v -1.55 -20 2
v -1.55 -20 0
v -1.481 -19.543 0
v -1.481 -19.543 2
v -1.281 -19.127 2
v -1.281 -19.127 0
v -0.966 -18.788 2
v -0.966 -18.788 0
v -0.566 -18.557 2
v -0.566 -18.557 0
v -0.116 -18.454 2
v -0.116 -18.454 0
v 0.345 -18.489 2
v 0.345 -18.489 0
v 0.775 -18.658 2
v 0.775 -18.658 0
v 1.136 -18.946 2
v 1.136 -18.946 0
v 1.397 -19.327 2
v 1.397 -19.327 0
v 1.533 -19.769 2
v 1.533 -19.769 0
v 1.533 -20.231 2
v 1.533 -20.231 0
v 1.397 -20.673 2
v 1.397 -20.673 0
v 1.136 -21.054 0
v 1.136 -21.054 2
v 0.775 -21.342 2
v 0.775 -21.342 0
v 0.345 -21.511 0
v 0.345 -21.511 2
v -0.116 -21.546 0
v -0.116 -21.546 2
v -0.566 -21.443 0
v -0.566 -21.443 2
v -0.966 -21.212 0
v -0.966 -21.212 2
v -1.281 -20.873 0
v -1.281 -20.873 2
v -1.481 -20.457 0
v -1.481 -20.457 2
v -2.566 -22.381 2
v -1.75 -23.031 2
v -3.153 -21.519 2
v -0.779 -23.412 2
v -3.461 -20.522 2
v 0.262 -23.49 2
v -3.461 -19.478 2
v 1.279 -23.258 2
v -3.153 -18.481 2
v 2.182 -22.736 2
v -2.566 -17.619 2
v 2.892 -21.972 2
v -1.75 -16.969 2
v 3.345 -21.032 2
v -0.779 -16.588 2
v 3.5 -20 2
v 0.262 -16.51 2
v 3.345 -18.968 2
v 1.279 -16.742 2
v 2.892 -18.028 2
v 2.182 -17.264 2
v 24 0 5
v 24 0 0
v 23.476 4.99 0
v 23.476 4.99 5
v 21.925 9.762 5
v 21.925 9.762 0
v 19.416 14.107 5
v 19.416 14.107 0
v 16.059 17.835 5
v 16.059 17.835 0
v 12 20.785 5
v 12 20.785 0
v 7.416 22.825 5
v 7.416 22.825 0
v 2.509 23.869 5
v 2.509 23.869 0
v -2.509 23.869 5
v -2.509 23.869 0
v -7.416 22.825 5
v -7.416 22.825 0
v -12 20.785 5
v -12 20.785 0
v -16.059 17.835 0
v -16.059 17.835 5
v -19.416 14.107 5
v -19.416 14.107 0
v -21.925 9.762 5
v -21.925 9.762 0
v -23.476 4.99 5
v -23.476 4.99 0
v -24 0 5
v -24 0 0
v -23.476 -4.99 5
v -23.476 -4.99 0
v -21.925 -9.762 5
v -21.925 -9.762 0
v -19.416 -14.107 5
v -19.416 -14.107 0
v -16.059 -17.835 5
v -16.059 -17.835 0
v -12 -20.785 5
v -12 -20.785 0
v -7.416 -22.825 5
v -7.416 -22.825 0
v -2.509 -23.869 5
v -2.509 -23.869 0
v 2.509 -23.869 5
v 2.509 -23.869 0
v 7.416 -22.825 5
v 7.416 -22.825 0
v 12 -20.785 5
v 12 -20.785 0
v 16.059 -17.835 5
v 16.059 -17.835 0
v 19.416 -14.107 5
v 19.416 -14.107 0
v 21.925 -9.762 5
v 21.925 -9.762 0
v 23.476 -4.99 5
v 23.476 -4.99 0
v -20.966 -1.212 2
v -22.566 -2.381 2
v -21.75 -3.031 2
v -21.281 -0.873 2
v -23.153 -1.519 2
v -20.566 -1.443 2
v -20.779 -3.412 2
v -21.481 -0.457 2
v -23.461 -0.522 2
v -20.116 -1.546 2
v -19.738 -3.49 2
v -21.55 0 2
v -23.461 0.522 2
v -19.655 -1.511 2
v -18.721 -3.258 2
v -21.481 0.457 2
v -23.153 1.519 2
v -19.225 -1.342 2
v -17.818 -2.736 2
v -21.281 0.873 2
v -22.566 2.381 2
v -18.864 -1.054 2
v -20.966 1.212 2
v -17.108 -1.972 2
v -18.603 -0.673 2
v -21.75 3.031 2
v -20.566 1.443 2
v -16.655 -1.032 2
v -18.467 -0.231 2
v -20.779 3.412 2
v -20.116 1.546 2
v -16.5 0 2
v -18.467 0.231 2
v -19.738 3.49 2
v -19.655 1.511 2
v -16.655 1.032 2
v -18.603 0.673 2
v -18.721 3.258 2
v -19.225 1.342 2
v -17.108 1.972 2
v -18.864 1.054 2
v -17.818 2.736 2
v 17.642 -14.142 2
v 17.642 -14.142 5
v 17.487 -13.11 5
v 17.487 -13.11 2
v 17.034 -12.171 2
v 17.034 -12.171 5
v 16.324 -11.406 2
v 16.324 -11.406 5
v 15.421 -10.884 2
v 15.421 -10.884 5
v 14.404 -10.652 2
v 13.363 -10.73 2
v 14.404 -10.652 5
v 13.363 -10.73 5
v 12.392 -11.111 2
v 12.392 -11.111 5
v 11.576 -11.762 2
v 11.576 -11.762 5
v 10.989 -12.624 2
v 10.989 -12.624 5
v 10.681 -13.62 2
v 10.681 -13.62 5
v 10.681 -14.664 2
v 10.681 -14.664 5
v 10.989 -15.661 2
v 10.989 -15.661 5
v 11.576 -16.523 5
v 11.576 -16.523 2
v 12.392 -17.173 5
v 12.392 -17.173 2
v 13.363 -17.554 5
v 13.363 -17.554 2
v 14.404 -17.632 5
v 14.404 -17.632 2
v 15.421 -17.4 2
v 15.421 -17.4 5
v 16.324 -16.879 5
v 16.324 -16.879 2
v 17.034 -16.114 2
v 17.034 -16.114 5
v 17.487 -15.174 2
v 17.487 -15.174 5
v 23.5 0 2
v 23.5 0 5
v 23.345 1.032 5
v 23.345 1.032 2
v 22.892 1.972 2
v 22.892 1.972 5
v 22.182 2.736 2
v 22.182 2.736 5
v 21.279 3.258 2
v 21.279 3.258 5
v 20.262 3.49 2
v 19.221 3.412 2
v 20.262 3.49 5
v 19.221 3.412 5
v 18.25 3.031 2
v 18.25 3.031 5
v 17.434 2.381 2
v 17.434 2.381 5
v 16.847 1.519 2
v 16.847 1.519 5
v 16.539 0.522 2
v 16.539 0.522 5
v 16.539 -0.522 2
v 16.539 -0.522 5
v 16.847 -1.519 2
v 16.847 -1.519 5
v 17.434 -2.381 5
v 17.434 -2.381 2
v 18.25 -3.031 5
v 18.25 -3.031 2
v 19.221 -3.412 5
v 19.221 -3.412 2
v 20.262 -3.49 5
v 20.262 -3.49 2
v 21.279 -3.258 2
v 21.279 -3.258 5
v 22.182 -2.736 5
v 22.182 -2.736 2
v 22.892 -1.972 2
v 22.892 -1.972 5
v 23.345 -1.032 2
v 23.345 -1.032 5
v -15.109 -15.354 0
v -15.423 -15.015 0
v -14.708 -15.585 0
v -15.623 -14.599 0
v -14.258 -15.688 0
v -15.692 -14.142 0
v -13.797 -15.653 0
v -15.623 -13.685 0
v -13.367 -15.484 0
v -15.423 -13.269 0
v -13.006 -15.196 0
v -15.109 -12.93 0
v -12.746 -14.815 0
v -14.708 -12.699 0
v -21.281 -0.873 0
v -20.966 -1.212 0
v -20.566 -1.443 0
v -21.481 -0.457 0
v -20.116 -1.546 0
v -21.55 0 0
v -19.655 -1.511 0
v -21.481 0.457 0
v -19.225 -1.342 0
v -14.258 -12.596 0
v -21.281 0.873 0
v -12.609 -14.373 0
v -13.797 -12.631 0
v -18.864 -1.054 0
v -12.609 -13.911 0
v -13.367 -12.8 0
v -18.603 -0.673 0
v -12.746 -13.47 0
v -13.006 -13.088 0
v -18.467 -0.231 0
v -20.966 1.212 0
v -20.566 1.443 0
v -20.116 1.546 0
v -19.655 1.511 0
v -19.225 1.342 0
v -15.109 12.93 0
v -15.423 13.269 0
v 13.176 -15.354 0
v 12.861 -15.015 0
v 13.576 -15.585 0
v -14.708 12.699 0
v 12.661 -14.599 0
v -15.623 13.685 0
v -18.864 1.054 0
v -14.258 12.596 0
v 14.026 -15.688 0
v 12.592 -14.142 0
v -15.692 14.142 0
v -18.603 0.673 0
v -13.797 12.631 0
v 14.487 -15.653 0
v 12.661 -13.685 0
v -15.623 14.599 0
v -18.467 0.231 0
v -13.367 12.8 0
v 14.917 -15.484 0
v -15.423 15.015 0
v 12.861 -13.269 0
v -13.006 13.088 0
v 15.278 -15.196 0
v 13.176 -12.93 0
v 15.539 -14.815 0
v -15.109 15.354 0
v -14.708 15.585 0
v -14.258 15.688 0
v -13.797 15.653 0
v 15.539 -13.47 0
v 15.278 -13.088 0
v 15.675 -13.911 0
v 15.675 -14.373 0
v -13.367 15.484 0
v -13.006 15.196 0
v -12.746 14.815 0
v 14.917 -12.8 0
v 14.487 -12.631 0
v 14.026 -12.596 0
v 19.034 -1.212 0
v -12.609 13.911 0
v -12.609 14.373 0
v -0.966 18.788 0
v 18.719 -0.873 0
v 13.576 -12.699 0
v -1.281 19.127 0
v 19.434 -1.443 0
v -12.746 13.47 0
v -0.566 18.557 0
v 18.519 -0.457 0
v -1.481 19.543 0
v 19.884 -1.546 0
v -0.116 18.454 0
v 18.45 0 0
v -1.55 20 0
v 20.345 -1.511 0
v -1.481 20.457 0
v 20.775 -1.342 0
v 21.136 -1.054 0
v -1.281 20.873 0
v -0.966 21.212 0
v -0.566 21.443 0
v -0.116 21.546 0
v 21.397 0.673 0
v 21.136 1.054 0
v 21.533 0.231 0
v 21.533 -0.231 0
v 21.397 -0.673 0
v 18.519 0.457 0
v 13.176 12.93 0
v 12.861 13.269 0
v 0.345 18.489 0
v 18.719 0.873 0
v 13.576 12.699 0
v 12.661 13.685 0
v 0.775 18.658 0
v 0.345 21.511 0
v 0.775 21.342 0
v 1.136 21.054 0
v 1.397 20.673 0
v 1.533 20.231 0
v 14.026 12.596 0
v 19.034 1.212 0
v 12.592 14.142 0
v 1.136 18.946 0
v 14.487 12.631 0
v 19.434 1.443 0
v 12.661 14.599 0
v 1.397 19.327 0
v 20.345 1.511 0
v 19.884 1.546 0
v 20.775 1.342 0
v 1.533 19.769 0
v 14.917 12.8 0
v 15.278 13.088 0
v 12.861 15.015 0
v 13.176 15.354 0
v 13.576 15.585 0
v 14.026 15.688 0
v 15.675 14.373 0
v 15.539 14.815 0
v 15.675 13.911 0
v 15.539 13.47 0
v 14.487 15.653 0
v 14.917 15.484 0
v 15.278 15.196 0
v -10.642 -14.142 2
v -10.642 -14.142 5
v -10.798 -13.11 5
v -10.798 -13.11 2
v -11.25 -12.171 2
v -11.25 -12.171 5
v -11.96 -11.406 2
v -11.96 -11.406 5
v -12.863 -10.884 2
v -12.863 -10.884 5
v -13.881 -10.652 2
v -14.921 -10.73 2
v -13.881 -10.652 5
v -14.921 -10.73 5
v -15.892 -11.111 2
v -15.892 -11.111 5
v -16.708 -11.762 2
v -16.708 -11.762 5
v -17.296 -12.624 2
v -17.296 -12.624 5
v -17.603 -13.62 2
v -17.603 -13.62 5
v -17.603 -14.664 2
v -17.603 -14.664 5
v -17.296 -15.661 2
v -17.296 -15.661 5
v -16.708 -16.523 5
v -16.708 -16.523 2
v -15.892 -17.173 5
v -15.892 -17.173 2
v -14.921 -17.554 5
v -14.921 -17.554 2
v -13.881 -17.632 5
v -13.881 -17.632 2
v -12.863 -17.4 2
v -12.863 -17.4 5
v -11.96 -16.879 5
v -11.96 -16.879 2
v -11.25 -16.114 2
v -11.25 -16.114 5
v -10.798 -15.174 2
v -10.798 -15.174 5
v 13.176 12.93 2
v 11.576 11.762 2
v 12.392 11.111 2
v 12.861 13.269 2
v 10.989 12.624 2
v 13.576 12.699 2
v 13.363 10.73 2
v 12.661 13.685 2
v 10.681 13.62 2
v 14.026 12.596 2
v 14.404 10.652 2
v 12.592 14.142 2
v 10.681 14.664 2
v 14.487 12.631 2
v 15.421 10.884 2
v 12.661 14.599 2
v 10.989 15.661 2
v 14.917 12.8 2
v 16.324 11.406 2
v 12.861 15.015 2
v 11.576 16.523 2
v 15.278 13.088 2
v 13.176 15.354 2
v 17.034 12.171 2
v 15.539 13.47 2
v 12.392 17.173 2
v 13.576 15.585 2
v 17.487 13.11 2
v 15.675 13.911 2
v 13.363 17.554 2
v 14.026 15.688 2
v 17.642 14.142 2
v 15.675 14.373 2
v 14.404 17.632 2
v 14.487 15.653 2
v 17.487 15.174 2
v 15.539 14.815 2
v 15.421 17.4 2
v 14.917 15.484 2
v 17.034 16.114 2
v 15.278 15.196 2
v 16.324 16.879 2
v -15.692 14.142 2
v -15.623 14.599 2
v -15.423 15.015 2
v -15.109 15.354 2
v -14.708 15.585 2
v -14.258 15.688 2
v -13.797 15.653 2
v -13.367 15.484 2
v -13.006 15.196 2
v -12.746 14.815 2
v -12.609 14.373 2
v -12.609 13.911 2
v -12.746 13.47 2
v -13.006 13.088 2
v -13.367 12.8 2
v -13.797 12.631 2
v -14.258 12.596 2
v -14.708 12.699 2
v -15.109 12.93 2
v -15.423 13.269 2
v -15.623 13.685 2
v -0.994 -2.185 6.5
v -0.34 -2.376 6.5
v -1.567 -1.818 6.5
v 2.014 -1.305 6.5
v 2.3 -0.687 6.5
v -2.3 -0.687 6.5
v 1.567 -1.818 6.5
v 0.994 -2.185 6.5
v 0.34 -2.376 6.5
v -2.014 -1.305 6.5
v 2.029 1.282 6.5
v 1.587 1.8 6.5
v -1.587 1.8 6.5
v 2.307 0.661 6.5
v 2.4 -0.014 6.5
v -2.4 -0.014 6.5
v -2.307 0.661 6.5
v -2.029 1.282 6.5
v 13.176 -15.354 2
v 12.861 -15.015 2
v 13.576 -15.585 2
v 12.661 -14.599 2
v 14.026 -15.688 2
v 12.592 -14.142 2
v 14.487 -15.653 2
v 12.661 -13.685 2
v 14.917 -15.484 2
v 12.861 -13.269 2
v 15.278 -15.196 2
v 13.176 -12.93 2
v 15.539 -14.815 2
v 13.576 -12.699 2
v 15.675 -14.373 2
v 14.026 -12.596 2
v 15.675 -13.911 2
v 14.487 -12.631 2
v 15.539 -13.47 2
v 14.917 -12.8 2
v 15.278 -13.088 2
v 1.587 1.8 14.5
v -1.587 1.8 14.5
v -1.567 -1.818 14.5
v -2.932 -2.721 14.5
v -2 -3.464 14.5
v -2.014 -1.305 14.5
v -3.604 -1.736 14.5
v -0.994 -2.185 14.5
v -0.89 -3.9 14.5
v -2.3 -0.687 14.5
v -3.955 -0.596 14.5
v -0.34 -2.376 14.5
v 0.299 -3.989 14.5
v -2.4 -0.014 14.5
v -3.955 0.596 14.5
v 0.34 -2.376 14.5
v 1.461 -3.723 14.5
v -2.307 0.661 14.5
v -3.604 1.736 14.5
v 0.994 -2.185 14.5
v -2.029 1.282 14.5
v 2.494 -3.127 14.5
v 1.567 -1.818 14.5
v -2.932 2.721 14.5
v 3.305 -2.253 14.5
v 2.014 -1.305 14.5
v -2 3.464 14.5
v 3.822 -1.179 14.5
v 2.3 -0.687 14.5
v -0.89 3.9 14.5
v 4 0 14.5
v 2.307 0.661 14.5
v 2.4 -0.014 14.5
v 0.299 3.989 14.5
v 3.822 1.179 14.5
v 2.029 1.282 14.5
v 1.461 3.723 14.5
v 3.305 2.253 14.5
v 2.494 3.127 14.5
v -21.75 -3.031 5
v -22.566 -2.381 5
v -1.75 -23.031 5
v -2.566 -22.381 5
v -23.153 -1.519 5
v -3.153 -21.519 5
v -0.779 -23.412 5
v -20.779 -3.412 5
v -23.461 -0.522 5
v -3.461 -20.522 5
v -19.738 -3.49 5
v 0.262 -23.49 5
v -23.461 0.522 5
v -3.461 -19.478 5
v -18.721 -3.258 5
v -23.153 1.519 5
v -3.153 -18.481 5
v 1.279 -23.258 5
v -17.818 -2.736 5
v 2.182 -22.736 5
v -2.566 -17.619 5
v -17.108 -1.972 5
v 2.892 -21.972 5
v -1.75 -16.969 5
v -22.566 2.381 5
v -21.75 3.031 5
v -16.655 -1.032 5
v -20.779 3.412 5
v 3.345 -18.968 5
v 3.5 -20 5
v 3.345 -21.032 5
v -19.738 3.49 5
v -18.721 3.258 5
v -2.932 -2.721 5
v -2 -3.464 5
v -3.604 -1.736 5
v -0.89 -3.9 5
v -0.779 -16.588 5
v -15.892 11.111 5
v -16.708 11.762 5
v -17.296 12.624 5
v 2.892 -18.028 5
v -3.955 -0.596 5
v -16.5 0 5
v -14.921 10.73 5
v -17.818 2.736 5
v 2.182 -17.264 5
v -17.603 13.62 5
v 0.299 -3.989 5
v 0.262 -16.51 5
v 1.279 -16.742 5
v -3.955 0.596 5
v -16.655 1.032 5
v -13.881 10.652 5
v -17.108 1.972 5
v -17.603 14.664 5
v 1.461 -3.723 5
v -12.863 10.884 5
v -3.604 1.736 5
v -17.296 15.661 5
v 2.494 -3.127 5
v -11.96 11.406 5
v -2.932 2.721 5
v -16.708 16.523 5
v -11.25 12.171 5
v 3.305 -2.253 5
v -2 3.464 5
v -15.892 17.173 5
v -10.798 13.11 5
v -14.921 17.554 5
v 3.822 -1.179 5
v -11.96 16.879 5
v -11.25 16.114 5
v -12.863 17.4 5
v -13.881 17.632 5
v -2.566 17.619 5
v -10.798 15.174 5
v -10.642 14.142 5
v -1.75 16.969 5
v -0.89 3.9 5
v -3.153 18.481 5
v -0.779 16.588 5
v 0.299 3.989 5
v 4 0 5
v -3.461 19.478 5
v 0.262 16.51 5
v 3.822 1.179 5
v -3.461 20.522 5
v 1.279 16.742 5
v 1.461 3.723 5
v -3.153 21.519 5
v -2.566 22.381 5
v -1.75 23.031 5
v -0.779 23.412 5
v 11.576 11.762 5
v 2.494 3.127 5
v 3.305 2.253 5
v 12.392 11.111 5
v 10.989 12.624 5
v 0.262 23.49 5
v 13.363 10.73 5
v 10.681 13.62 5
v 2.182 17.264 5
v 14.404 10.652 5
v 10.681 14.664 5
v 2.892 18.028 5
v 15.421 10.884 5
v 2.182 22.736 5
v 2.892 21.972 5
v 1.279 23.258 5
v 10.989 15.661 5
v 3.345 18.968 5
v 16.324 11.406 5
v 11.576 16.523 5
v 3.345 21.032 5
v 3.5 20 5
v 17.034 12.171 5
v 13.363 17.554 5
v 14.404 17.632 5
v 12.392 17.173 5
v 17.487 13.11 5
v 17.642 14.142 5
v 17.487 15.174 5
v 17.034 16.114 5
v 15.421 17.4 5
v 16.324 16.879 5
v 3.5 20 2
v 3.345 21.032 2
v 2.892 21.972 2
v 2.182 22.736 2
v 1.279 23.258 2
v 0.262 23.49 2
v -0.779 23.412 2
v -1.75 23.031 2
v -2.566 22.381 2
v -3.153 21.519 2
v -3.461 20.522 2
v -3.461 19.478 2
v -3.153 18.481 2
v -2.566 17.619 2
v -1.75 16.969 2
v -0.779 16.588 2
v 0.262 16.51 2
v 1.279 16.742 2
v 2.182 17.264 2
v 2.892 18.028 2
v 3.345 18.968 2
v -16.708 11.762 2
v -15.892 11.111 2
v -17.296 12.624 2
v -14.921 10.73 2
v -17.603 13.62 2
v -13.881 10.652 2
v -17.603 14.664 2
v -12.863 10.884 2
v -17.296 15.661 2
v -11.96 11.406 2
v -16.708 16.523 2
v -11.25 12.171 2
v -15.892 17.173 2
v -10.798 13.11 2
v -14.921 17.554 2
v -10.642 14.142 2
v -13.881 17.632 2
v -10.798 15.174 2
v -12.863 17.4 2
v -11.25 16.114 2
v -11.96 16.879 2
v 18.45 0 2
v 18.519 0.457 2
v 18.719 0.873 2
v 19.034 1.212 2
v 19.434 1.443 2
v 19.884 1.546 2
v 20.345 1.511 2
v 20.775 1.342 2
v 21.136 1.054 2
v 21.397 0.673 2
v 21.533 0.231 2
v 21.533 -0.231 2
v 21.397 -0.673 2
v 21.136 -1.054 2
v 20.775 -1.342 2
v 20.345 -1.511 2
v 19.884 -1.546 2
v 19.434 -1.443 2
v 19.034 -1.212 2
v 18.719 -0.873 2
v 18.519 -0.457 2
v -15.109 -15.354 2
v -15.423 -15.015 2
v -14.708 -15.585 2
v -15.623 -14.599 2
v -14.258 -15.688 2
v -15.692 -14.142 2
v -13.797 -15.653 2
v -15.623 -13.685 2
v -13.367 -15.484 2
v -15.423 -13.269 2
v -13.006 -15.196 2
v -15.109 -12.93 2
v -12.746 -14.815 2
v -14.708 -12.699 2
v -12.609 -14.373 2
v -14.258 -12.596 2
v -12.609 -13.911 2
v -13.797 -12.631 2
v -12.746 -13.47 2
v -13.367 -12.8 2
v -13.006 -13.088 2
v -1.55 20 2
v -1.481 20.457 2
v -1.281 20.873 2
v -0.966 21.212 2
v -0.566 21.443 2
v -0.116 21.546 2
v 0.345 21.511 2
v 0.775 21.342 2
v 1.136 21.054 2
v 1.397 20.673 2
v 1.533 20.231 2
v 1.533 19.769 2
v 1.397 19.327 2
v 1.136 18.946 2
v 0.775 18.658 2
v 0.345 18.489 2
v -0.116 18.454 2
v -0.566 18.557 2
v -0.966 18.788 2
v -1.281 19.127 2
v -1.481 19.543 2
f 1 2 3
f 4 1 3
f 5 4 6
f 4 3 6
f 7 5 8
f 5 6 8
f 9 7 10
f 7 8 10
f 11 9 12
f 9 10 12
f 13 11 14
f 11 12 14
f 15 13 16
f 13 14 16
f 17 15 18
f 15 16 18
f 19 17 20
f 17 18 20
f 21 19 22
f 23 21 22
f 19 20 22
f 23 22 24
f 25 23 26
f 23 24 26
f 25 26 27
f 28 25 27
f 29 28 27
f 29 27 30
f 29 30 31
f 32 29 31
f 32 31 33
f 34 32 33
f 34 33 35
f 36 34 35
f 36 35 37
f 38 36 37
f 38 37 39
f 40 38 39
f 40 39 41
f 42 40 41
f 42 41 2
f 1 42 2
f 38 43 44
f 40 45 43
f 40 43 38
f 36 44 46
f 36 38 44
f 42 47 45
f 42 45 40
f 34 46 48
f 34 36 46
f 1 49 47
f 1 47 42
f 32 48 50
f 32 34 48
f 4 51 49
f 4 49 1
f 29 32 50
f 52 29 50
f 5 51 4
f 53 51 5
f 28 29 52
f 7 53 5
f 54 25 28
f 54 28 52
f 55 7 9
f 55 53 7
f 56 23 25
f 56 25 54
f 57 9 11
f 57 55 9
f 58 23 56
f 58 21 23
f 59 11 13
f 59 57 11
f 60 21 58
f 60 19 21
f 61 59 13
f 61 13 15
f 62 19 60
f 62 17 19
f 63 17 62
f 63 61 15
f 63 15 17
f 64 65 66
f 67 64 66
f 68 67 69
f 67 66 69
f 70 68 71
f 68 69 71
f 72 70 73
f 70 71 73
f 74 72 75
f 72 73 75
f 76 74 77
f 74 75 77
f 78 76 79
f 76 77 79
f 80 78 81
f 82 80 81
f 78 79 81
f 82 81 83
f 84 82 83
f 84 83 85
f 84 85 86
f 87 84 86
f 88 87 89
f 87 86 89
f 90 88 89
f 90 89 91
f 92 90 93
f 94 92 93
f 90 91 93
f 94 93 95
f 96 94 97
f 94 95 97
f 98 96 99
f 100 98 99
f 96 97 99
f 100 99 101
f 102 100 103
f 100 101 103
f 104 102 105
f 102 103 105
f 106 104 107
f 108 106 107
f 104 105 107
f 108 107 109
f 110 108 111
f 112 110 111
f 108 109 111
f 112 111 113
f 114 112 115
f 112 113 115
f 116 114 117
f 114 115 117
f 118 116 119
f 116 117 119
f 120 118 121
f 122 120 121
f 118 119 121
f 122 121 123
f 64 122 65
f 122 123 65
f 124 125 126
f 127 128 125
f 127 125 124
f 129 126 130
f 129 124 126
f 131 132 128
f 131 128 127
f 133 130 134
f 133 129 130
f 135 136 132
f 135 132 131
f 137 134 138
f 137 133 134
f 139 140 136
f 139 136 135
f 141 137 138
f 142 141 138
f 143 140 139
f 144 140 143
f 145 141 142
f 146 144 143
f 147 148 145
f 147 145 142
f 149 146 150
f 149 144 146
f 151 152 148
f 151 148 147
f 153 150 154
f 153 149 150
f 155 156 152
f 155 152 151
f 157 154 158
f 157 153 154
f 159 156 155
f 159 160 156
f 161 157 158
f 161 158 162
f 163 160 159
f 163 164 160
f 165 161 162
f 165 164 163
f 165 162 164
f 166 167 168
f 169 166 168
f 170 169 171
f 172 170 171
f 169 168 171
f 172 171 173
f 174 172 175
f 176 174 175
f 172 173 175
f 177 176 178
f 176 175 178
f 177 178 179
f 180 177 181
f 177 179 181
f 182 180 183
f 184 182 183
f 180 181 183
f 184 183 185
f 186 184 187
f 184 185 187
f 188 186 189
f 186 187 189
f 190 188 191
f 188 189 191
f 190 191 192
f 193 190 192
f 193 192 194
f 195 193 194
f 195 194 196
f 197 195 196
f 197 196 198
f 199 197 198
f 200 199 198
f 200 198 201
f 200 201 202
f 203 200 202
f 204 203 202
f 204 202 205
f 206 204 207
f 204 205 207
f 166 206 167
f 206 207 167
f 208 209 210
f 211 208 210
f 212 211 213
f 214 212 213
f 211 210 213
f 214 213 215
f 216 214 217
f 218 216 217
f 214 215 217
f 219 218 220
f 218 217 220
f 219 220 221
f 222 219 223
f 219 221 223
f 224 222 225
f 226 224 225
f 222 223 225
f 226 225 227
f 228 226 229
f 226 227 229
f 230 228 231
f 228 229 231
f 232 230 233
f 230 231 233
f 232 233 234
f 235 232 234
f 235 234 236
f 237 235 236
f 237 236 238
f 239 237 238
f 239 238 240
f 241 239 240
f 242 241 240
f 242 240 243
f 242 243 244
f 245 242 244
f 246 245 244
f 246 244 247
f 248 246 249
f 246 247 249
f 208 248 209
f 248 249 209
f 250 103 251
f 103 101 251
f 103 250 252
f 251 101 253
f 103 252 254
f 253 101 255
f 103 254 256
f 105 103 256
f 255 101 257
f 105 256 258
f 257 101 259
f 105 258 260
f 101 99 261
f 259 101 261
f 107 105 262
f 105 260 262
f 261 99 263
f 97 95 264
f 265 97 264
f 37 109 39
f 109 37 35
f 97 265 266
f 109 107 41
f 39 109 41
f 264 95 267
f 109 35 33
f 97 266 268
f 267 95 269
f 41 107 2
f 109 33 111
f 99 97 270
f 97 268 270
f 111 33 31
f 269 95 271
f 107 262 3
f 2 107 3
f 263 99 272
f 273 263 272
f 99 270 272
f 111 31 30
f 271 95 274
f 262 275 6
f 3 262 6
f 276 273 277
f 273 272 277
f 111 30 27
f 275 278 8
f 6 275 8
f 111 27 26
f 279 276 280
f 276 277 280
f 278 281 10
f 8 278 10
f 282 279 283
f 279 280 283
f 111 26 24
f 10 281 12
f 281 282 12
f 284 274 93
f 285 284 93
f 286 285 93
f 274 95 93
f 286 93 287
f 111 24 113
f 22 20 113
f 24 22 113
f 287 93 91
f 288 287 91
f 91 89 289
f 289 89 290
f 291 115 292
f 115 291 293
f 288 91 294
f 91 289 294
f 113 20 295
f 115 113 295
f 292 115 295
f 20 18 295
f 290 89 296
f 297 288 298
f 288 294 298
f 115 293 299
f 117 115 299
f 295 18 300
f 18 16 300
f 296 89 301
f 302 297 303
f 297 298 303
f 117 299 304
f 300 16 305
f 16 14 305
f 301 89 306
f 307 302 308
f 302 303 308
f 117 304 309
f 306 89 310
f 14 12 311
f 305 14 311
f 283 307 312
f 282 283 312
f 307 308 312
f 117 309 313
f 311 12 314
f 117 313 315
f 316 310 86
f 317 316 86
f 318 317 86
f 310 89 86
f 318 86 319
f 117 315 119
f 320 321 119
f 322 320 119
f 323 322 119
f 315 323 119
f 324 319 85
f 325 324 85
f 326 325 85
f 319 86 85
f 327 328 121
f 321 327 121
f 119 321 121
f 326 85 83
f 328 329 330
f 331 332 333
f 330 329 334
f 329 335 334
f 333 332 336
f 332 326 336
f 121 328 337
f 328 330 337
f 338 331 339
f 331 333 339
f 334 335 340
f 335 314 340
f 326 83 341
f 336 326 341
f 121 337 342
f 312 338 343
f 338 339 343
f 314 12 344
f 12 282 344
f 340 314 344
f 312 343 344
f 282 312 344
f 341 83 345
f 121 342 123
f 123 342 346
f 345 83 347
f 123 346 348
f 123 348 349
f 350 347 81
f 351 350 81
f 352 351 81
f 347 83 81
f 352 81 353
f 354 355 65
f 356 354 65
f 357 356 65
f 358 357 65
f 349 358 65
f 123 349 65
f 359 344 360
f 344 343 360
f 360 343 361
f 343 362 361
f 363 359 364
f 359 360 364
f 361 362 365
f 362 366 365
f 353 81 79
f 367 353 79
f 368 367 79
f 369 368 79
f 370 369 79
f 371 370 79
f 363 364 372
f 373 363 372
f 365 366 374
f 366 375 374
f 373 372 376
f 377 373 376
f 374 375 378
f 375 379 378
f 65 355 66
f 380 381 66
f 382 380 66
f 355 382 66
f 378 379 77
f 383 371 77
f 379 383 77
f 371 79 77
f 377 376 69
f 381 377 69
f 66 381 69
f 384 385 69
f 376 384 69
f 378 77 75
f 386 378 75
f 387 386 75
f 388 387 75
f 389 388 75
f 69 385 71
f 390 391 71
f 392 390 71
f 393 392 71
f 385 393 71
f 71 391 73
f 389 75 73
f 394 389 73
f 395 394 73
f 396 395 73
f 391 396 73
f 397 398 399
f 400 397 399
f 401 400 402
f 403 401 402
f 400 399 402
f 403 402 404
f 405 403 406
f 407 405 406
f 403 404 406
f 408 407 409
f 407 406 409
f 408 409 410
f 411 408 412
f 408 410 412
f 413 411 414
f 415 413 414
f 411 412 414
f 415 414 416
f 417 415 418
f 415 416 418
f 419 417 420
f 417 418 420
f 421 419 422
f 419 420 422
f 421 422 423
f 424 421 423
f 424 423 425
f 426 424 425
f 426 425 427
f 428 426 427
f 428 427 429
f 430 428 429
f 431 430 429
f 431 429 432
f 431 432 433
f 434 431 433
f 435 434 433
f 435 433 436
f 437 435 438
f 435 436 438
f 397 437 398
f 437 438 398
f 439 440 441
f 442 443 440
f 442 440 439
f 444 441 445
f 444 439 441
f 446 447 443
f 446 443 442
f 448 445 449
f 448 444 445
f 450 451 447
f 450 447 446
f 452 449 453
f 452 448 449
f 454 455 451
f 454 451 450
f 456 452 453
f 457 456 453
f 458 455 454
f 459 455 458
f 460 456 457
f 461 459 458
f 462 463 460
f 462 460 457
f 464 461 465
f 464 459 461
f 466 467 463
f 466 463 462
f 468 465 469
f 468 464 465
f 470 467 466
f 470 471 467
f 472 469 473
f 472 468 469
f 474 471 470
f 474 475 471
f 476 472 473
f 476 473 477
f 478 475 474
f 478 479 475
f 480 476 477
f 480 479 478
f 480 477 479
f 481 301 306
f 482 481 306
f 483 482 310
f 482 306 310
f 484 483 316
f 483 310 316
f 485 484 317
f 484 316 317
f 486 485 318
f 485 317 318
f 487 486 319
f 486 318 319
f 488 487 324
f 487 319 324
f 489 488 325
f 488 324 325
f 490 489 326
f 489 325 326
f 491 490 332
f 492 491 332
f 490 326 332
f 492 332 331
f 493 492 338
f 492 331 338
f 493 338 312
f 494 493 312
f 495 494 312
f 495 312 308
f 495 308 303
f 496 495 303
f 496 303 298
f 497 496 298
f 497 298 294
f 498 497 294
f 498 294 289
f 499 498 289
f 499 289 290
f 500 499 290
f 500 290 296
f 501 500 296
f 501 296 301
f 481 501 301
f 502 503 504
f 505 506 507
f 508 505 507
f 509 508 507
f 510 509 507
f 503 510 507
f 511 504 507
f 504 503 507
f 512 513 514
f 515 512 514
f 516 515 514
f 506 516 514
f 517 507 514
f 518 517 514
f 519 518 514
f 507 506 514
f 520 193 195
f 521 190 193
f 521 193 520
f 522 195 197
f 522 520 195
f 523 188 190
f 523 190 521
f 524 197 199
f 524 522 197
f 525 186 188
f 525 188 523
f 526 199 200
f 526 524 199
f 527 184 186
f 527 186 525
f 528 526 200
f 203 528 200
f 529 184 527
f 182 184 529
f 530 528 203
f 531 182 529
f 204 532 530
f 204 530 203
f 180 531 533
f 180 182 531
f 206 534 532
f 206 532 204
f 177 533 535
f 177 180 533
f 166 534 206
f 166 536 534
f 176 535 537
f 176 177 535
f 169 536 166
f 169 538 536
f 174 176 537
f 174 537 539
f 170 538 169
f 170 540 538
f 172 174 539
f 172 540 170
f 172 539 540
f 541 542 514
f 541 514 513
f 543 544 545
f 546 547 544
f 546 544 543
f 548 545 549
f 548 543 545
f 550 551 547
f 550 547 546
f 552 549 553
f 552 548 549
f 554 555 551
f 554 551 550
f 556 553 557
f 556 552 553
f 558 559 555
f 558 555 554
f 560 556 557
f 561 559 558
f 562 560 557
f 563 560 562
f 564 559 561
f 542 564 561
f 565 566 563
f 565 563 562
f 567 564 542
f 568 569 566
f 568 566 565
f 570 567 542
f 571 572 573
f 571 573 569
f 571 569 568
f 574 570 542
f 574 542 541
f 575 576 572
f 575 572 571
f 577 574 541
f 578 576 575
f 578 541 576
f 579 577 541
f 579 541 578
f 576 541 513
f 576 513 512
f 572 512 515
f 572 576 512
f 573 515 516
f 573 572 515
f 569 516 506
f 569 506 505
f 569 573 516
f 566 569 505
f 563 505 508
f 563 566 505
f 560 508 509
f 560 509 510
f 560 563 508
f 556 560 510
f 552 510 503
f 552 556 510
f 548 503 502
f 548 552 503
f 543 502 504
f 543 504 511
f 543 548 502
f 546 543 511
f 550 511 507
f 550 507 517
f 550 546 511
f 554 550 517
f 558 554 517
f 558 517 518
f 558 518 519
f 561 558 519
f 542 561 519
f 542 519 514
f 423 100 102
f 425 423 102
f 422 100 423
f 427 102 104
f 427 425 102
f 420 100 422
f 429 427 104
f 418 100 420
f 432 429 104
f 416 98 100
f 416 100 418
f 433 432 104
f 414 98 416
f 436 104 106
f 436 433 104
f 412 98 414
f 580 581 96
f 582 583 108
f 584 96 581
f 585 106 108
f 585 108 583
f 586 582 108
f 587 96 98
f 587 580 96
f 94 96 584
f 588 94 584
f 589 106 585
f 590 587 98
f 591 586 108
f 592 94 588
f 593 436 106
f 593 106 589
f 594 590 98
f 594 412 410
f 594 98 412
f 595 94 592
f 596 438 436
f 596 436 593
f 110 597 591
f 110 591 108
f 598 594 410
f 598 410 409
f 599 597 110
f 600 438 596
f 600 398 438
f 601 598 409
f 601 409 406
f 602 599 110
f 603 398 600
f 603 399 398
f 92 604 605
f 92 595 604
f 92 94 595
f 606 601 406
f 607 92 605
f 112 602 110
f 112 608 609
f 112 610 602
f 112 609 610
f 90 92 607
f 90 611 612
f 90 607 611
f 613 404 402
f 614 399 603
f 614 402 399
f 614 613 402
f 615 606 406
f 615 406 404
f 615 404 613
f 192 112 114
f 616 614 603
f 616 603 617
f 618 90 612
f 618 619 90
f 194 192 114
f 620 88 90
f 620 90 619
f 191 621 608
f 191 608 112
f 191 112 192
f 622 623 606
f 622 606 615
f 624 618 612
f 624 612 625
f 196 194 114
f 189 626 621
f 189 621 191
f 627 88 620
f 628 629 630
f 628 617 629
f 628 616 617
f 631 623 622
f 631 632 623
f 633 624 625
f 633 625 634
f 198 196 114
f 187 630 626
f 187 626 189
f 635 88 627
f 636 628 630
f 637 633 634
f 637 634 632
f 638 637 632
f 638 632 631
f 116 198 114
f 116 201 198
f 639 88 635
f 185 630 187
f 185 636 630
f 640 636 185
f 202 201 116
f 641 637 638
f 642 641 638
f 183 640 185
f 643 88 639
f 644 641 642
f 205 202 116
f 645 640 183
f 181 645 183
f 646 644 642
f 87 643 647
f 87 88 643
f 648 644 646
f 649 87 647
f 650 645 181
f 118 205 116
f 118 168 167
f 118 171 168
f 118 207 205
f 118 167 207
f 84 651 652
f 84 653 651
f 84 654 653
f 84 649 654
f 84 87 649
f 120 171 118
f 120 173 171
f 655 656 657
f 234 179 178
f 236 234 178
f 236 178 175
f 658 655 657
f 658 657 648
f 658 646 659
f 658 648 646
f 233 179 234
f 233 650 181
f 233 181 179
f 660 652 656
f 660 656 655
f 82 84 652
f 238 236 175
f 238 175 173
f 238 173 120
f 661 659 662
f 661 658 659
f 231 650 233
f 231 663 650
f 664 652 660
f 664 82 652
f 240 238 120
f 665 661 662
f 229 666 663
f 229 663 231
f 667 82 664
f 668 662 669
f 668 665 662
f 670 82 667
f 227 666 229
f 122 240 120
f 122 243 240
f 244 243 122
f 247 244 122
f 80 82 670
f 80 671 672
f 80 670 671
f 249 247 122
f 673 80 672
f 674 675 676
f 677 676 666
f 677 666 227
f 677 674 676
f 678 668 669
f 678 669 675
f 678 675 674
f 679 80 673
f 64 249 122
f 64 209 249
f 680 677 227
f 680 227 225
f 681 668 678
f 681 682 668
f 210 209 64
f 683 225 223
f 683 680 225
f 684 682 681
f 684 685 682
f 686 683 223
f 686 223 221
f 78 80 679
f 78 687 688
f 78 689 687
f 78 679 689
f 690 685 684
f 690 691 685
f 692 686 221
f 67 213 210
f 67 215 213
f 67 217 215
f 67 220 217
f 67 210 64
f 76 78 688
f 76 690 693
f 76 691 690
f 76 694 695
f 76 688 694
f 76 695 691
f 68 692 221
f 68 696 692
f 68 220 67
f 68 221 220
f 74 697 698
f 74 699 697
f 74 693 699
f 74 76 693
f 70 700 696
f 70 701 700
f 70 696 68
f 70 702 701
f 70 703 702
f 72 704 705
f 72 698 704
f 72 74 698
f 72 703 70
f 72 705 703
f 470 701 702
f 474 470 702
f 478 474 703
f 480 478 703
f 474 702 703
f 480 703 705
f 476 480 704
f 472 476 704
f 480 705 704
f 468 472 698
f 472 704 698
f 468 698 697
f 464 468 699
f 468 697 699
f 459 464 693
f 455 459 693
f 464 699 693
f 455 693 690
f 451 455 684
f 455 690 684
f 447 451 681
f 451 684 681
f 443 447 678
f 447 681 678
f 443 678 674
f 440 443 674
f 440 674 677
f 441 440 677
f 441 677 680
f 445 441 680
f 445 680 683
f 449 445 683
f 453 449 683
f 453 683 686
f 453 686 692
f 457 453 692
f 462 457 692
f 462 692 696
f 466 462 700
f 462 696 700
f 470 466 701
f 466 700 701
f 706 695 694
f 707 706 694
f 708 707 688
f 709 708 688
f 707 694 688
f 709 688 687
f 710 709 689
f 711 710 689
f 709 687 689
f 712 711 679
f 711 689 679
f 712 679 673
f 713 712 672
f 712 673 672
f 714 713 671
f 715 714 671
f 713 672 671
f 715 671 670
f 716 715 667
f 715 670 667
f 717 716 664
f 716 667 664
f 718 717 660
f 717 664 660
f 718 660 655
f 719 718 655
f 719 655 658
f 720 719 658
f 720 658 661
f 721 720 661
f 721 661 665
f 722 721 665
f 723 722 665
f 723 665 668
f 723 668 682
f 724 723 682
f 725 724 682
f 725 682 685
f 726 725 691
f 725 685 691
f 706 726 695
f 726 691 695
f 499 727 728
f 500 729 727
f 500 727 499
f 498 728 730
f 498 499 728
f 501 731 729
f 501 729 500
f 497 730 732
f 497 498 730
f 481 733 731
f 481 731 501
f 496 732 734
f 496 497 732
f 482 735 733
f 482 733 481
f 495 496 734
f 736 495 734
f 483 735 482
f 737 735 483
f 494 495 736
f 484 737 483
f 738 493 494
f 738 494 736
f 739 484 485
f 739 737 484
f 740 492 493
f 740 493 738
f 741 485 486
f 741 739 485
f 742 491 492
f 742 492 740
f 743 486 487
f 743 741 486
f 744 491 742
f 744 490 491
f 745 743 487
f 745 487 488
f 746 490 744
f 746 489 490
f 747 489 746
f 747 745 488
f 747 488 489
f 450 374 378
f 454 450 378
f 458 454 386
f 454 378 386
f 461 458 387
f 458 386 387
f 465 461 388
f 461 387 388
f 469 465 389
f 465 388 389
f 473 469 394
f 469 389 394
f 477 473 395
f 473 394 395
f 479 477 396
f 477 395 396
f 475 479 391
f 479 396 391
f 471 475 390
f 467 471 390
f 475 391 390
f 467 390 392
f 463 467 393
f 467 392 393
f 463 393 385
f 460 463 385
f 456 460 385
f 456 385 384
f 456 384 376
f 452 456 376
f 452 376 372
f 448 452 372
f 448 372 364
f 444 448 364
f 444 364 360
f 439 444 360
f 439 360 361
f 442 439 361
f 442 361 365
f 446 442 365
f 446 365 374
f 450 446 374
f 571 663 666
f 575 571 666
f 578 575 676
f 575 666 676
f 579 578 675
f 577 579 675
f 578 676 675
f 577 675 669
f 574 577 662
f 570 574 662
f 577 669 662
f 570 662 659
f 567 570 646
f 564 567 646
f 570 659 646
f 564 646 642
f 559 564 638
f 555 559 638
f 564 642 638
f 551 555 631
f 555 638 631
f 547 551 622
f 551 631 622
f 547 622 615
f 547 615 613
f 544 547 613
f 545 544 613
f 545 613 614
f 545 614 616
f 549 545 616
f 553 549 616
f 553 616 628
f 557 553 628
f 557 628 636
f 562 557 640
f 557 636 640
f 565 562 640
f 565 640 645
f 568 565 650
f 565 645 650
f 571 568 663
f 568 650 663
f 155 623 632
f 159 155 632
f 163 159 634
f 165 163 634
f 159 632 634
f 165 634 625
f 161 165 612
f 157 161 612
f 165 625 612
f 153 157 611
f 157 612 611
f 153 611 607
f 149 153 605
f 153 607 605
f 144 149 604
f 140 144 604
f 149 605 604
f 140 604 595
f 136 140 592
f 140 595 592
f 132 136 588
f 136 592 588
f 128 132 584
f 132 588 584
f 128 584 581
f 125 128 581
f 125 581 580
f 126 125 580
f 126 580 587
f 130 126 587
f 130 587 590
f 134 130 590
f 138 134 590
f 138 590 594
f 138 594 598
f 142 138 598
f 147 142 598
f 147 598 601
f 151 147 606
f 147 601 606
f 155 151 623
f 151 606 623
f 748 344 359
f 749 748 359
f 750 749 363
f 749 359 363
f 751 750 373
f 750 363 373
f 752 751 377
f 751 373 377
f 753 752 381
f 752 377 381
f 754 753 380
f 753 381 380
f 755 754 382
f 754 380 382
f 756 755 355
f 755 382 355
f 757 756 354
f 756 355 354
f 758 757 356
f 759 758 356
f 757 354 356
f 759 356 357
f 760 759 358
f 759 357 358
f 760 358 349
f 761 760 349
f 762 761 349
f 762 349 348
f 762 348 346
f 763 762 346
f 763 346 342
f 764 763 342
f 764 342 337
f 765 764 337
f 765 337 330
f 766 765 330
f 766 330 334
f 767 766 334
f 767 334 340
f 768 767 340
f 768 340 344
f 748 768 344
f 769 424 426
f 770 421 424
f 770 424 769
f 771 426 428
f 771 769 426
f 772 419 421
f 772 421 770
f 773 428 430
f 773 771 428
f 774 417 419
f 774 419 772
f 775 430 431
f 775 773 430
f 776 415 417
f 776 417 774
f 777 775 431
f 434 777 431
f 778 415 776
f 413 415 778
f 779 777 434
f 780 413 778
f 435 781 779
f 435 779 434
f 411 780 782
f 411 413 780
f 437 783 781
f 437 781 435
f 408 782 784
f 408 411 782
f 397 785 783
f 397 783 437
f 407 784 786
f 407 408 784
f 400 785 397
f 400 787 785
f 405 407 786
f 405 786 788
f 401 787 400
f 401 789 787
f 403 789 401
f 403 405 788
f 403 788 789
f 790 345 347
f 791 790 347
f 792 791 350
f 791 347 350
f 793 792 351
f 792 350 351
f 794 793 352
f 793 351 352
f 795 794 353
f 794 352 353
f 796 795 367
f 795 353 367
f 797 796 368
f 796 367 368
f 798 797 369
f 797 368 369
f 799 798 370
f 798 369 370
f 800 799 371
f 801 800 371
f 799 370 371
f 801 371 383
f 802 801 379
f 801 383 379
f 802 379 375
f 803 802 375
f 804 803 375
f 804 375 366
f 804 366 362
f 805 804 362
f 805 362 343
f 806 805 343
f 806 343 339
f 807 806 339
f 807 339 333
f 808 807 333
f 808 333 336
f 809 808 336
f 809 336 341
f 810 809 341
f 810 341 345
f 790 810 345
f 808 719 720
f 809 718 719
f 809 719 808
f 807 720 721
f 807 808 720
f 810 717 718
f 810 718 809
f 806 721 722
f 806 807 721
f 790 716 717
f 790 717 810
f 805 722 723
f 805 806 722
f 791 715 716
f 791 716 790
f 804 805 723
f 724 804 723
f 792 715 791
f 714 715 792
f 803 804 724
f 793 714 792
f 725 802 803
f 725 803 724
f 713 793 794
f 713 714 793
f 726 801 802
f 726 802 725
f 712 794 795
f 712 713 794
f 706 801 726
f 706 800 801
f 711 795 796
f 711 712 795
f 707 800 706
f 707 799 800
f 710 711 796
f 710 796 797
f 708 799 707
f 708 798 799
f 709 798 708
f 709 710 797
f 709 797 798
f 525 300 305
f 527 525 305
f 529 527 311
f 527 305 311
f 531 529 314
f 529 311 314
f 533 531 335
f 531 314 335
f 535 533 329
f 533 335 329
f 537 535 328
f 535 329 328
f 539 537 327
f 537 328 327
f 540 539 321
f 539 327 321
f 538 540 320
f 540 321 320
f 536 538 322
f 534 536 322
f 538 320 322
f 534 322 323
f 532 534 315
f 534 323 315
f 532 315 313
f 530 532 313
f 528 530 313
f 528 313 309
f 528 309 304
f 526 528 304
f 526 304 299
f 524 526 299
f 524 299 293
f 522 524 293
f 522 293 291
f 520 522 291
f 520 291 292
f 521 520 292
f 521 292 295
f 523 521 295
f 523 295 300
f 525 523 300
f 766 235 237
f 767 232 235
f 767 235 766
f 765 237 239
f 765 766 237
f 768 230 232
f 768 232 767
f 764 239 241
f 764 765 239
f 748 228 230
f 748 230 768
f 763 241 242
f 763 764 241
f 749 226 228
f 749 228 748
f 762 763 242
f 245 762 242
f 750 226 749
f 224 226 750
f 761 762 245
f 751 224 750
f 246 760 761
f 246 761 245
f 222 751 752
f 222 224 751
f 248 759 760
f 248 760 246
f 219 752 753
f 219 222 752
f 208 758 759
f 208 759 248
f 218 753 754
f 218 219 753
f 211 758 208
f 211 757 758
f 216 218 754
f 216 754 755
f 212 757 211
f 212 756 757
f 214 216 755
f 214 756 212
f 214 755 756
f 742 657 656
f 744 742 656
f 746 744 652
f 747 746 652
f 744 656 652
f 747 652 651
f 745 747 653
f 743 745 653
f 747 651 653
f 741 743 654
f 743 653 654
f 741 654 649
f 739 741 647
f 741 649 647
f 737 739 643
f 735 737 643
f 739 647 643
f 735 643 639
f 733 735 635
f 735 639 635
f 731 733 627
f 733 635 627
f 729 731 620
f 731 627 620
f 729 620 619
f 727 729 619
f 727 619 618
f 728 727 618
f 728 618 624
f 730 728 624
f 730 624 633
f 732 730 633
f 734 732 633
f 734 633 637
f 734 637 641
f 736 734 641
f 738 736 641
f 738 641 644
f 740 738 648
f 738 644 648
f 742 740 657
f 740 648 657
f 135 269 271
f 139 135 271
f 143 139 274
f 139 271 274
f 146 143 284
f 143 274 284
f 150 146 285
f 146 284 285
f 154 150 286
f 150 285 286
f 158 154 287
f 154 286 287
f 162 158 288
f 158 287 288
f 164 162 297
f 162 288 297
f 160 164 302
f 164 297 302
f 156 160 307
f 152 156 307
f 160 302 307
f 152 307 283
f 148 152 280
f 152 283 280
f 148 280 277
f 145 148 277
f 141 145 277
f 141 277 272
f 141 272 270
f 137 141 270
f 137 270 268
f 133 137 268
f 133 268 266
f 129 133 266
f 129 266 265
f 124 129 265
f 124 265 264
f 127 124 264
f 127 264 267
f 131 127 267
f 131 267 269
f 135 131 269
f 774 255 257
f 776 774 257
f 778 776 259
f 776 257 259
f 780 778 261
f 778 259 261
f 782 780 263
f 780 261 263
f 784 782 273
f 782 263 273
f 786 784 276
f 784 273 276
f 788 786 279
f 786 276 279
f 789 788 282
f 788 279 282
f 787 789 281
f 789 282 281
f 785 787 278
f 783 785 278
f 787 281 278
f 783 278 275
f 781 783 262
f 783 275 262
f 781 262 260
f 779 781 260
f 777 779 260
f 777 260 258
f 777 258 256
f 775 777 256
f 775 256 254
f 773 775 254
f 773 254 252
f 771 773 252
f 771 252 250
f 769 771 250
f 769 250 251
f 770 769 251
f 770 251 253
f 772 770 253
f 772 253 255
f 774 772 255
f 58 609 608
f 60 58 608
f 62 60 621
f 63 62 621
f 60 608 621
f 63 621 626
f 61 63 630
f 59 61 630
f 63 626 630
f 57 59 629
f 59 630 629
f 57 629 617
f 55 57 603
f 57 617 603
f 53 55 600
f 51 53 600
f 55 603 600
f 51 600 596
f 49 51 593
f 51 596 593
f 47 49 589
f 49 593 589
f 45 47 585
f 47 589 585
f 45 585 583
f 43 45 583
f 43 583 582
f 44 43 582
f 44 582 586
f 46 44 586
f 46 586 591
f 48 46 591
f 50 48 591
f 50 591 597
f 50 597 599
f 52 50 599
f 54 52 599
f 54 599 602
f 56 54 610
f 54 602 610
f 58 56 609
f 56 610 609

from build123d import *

# Parameters (mm, degrees)
SKETCH6_R           = 24
BOSS_EXTRUDE1_DEPTH = 5
SKETCH8_R           = 1.55
CUT_EXTRUDE6_DEPTH  = 5
SKETCH10_R          = 4
BOSS_EXTRUDE2_DEPTH = 9.5
SKETCH11_R          = 3.5
CUT_EXTRUDE8_DEPTH  = 3
CUT_EXTRUDE9_DEPTH  = 8


with BuildPart() as part:
    # Sketch6 → Boss-Extrude1 (new body)
    with BuildSketch(Plane.XY):
        Circle(SKETCH6_R)
    extrude(amount=BOSS_EXTRUDE1_DEPTH)

    # Sketch8 → Cut-Extrude6 (cut)
    with BuildSketch(Plane(origin=(0, 0, 0), x_dir=(-1, 0, 0), z_dir=(0, 0, -1))):
        with Locations((0, 20)):
            Circle(SKETCH8_R)
        with Locations((14.142135624, 14.142135624)):
            Circle(SKETCH8_R)
        with Locations((20, 0)):
            Circle(SKETCH8_R)
        with Locations((14.142135624, -14.142135624)):
            Circle(SKETCH8_R)
        with Locations((0, -20)):
            Circle(SKETCH8_R)
        with Locations((-14.142135624, -14.142135624)):
            Circle(SKETCH8_R)
        with Locations((-20, 0)):
            Circle(SKETCH8_R)
        with Locations((-14.142135624, 14.142135624)):
            Circle(SKETCH8_R)
    extrude(amount=-CUT_EXTRUDE6_DEPTH, mode=Mode.SUBTRACT)

    # Sketch10 → Boss-Extrude2 (add)
    with BuildSketch(Plane.XY.offset(5)):
        Circle(SKETCH10_R)
    extrude(amount=BOSS_EXTRUDE2_DEPTH)

    # Sketch11 → Cut-Extrude8 (cut)
    with BuildSketch(Plane.XY.offset(5)):
        with Locations((0, 20)):
            Circle(SKETCH11_R)
        with Locations((14.142135624, 14.142135624)):
            Circle(SKETCH11_R)
        with Locations((20, 0)):
            Circle(SKETCH11_R)
        with Locations((14.142135624, -14.142135624)):
            Circle(SKETCH11_R)
        with Locations((0, -20)):
            Circle(SKETCH11_R)
        with Locations((-14.142135624, -14.142135624)):
            Circle(SKETCH11_R)
        with Locations((-20, 0)):
            Circle(SKETCH11_R)
        with Locations((-14.142135624, 14.142135624)):
            Circle(SKETCH11_R)
    extrude(amount=-CUT_EXTRUDE8_DEPTH, mode=Mode.SUBTRACT)

    # Sketch12 → Cut-Extrude9 (cut)
    with BuildSketch(Plane.XY.offset(14.5)):
        with BuildLine():
            Line((-1.587450787, 1.8), (1.587450787, 1.8))
            ThreePointArc((1.587450787, 1.8), (0, -2.4), (-1.587450787, 1.8))
        make_face()
    extrude(amount=-CUT_EXTRUDE9_DEPTH, mode=Mode.SUBTRACT)


solid = part.part
